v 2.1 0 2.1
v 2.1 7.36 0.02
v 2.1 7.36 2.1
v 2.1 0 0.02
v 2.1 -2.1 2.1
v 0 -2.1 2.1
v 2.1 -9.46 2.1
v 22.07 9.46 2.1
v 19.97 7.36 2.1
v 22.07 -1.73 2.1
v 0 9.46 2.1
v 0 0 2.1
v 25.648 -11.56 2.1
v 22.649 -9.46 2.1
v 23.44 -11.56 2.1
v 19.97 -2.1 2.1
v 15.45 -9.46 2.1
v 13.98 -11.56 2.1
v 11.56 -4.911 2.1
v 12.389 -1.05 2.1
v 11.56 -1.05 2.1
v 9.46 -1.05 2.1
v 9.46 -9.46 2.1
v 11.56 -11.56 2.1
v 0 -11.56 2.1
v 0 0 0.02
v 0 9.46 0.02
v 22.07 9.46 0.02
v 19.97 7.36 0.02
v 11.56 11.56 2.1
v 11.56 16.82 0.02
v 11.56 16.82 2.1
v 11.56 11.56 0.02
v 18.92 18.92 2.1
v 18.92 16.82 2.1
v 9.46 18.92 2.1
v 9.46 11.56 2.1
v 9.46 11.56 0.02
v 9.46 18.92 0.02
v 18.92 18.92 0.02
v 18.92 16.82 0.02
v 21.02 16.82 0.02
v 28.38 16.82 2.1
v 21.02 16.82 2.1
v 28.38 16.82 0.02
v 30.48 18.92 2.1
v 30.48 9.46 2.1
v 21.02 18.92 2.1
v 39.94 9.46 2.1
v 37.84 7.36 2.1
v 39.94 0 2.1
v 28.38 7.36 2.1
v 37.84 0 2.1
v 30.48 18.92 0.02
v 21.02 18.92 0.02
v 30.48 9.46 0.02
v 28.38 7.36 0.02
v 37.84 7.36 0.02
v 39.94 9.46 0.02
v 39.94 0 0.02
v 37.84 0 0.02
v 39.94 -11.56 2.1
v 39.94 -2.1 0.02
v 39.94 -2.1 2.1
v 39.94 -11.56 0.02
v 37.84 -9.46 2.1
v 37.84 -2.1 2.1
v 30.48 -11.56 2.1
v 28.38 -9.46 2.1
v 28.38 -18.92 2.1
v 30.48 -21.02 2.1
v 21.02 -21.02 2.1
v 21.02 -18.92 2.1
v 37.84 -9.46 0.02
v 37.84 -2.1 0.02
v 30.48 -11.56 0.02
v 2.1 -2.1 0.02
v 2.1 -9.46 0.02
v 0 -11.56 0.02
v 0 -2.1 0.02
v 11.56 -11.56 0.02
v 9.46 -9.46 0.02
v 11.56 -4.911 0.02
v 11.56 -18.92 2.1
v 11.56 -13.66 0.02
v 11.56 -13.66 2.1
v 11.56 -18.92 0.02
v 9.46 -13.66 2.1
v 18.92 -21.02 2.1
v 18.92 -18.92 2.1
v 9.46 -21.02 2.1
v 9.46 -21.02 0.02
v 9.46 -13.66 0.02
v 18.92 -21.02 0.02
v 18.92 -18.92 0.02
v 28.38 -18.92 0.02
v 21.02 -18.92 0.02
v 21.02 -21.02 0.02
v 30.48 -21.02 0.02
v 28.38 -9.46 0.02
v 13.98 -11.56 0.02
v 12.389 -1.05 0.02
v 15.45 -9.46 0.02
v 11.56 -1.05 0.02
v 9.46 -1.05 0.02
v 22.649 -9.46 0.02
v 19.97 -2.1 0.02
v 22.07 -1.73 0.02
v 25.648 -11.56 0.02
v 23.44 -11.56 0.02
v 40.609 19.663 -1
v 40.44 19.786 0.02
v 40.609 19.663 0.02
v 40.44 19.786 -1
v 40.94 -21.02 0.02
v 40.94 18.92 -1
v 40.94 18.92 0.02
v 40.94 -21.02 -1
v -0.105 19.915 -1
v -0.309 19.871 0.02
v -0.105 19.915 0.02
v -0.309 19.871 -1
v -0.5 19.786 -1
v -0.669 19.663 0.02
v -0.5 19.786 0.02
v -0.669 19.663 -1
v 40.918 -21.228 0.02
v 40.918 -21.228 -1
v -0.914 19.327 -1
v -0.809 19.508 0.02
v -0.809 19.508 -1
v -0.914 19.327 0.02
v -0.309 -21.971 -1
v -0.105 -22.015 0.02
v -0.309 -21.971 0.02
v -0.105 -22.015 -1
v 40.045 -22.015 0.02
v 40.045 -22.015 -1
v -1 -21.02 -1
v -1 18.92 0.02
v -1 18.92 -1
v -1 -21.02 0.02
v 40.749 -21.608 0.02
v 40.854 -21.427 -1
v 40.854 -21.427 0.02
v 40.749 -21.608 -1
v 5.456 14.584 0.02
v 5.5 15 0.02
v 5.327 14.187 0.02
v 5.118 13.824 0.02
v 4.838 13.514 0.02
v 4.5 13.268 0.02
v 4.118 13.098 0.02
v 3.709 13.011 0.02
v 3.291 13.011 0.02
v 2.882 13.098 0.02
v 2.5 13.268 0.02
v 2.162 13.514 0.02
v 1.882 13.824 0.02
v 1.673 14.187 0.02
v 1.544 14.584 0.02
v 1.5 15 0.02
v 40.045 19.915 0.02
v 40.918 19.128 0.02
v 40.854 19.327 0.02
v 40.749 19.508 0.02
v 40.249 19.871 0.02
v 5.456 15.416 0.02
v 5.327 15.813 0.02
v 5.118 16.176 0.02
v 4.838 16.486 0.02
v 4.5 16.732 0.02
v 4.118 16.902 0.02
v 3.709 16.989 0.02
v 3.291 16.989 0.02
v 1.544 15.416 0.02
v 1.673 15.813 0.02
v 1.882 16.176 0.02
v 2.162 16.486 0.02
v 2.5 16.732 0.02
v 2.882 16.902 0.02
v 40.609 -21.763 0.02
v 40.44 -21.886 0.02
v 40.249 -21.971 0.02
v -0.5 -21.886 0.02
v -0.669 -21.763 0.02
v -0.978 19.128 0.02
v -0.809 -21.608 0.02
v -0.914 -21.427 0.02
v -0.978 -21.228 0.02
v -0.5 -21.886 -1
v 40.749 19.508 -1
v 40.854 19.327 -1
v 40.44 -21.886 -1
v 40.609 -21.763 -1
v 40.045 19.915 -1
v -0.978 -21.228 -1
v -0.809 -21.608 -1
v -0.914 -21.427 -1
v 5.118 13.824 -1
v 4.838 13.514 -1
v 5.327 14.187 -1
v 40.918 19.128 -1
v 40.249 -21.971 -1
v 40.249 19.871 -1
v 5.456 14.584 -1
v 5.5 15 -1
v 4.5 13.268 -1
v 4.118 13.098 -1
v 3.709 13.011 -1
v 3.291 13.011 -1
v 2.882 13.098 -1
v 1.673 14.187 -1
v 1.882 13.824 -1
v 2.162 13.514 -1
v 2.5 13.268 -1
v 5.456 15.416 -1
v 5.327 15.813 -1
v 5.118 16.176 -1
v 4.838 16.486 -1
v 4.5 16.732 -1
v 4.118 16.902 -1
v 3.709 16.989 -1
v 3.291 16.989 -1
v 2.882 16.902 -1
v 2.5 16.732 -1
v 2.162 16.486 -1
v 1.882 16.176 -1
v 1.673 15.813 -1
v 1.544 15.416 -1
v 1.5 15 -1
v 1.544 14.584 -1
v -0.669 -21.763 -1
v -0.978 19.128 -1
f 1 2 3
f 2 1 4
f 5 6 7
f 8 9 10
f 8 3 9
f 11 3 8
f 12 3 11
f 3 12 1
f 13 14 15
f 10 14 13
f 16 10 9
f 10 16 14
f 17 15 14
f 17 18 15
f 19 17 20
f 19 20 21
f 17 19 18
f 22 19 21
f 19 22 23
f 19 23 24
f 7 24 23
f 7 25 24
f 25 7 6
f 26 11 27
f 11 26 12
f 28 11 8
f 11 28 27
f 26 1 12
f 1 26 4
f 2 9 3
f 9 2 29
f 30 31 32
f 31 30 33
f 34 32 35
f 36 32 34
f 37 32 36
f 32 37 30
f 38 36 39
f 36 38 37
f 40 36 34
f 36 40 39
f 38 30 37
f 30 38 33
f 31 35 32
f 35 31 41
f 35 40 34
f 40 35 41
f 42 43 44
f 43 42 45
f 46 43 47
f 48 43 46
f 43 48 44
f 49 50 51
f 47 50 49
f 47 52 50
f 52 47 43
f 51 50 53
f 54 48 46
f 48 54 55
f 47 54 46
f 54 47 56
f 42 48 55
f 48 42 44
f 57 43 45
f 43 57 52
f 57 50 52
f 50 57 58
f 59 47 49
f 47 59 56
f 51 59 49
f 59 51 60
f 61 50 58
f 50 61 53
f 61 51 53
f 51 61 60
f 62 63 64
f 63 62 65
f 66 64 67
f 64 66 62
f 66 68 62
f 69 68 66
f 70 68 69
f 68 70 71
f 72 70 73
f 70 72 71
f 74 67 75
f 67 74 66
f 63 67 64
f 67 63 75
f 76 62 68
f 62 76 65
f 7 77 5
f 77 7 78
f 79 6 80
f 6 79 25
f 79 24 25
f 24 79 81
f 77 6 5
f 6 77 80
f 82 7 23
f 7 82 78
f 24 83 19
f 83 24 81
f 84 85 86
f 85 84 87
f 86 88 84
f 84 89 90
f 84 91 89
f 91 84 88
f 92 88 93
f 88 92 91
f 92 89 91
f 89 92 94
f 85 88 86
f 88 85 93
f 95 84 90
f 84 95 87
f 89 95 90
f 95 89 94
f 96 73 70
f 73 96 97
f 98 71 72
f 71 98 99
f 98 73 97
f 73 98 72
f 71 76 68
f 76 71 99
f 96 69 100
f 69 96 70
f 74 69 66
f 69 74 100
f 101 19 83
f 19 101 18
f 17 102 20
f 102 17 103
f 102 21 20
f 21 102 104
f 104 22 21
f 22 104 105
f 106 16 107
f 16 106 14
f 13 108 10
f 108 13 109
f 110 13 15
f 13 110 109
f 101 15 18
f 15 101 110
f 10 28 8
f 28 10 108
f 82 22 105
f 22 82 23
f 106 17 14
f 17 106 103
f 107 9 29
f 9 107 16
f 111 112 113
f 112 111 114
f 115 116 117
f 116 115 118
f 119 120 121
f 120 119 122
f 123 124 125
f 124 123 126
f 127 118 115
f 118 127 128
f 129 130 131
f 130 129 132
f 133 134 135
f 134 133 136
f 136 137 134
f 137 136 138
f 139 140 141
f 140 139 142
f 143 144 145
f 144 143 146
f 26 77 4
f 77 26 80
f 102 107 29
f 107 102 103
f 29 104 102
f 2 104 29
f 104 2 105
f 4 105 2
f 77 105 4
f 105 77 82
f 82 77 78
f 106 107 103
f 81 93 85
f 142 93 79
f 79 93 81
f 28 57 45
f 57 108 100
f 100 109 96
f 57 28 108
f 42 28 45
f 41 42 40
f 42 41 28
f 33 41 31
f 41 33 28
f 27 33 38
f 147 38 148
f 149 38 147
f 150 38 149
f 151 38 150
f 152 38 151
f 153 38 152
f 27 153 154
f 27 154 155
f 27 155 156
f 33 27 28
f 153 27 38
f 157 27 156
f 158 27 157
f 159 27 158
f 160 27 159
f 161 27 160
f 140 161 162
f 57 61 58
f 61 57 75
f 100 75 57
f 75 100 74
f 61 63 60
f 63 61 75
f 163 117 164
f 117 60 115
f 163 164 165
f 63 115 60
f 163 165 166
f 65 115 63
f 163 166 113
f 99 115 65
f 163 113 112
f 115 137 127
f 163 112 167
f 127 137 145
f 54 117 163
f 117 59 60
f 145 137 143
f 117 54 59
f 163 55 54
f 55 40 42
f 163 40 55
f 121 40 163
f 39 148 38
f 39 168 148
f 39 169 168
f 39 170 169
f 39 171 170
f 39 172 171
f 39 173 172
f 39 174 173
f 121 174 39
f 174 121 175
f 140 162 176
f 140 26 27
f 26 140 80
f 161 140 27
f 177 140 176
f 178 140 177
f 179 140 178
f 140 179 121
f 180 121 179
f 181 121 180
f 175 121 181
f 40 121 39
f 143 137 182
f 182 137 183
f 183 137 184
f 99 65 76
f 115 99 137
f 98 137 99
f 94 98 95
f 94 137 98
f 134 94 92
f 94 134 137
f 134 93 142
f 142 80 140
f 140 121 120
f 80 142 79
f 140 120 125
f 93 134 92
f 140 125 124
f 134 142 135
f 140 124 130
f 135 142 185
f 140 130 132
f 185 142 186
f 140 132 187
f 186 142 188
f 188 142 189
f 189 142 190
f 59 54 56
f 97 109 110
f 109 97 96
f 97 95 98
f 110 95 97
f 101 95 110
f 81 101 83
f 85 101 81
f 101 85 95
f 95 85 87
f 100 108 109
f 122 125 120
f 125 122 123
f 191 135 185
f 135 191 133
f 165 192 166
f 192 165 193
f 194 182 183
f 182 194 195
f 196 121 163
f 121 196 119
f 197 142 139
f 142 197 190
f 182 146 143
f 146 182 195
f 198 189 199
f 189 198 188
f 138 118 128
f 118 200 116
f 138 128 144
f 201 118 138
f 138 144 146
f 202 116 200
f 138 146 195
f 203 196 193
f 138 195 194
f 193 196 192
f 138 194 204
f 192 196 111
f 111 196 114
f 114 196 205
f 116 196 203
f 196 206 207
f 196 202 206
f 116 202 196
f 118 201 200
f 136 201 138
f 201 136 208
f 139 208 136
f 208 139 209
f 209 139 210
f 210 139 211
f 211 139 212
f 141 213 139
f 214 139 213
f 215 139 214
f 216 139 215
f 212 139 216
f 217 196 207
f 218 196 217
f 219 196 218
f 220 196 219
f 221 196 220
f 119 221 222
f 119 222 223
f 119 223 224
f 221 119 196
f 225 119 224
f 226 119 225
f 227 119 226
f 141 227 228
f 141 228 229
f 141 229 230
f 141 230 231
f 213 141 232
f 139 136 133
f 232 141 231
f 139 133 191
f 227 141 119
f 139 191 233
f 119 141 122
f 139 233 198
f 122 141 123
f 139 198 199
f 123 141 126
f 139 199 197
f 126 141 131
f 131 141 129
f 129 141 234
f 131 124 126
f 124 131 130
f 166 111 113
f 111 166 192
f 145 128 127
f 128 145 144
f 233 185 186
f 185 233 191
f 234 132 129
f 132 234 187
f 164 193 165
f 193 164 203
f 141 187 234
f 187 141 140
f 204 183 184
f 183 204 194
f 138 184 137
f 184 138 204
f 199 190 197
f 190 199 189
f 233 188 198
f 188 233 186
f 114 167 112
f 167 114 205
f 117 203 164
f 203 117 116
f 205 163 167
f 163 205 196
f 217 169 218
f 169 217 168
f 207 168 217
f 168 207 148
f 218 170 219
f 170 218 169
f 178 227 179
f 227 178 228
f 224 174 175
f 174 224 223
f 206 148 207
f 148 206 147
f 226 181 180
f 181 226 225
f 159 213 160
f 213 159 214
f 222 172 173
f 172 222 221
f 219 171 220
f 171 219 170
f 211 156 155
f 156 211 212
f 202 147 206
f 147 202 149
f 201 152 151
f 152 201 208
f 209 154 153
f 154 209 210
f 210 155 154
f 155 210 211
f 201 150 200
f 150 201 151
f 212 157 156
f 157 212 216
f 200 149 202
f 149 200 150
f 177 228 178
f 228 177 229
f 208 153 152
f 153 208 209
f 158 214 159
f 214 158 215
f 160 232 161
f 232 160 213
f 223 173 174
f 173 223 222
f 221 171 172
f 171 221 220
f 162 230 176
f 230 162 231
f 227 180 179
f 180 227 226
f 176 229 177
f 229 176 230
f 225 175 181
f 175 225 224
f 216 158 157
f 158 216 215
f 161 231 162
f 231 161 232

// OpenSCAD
// Scale-factor for the Logo. (1 = 2cm) (Does not scale the plate-parameters.)
scale = 2;

// Be carefull: without a plate you get loose parts! (leave this 1)
plate = 1; // [1,0]

// Width of the plate (mm)
plateWidth = 1;

// Add (mm) to the plate on each side
plateAddLength = 1;

// 1 = the plate has round corners, 0 = the plate has NO round corners
plateRoundCorners = 1; // [1,0]

// radius for the round corners (mm)
plateRadius = 1;

// XPos for hole (mm)
plateHoleX = 3.5;

// YPos for hole (mm)
plateHoleY = 15;

// mm
plateHoleRadius = 2;

// Hidden
internalScale=0.01*1;
internalPlateWidth = plateWidth / internalScale / scale;
internalplateAddLength = plateAddLength / internalScale / scale;
internalPlateRadius = plateRadius / internalScale / scale;
internalPlateHoleX = plateHoleX / internalScale / scale;
internalPlateHoleY = plateHoleY / internalScale / scale;
internalPlateHoleRadius = plateHoleRadius / internalScale / scale;

width = 105*1;

base = 473*1;
biggerBase = base+width;
smallerBase = base-width;

rBase = biggerBase*1;

rShift = 121*1;

scale(scale*internalScale, scale*internalScale, scale*internalScale)
    rammstein();


module rammstein() {
        
    half();
    translate([0,-width,0]) 
        mirror([0,1,0]) 
            half();
    
    r();
    plate();
}

module plate() {
    length = base * 4 + width + internalplateAddLength*2 - (internalPlateRadius * 2 * plateRoundCorners);
   
    
    if (plate) {
        difference() {
            
            translate([-internalplateAddLength + (plateRoundCorners * internalPlateRadius),-length / 2 - width / 2,-internalPlateWidth]) {
                minkowski() {
                    cube([length,length,internalPlateWidth]);
                    if (plateRoundCorners) {
                        cylinder(r=internalPlateRadius);
                    }
                    
                };
            
            }
            translate([internalPlateHoleX, internalPlateHoleY])
                cylinder(h=internalPlateWidth*3, r=internalPlateHoleRadius, center=true);
        }
    }
}

module r() {
    // top
    translate([biggerBase-width,base,0])
        rotate([0,0,-90]) cube([width,biggerBase+width*0.5,width]);
    
    // left \
    difference() {
    
        translate([biggerBase + rShift,-biggerBase,0])
            rotate(20,0,0)cube([width,rBase,width]);
        
        translate([base,width * 0.5 ,-1])
                rotate([0,0,-90]) cube([width,width*2,width+2]); 
    };
    
    
     
    // right \
    difference() {
    
        translate([base * 2 + width*0.5,-width,0])
            rotate(20,0,0)translate([0,-biggerBase,0]) cube([width,biggerBase,width]);
        
        translate([biggerBase + rShift+ base / 2,-base-width,-1])
                rotate([0,0,-90]) cube([width,biggerBase,width+2]);  
    };
    
    
    // left
    translate([base,-biggerBase,0])
            cube([width,base+width*0.5,width]);
 
    
    //bottom
    translate([biggerBase + rShift,-base,0])
            rotate([0,0,-90]) cube([width,biggerBase-width,width]);
    
    // right
    translate([biggerBase*2-width*0.5-width,-width,0])
            cube([width,biggerBase,width]);
}

module half() {
    cube([width,base,width]);
    
    translate([0,base,0])
        rotate([0,0,-90]) cube([width,biggerBase,width]);
    
    translate([base,biggerBase,0])
        cube([width,smallerBase,width]);
    
    translate([base,base*2,0])
        rotate([0,0,-90]) cube([width,base,width]);
    
    translate([base*2+width,base*2,0])
        rotate([0,0,-90]) cube([width,base,width]);
    
    translate([base*3,smallerBase,0])
        cube([width,biggerBase,width]);
    
    translate([base*3,base,0])
        rotate([0,0,-90]) cube([width,biggerBase,width]);
    
    translate([base*4,0,0])
        cube([width,base,width]);
        
    translate([base*4,-biggerBase,0])
        cube([width,base,width]);
    
}
